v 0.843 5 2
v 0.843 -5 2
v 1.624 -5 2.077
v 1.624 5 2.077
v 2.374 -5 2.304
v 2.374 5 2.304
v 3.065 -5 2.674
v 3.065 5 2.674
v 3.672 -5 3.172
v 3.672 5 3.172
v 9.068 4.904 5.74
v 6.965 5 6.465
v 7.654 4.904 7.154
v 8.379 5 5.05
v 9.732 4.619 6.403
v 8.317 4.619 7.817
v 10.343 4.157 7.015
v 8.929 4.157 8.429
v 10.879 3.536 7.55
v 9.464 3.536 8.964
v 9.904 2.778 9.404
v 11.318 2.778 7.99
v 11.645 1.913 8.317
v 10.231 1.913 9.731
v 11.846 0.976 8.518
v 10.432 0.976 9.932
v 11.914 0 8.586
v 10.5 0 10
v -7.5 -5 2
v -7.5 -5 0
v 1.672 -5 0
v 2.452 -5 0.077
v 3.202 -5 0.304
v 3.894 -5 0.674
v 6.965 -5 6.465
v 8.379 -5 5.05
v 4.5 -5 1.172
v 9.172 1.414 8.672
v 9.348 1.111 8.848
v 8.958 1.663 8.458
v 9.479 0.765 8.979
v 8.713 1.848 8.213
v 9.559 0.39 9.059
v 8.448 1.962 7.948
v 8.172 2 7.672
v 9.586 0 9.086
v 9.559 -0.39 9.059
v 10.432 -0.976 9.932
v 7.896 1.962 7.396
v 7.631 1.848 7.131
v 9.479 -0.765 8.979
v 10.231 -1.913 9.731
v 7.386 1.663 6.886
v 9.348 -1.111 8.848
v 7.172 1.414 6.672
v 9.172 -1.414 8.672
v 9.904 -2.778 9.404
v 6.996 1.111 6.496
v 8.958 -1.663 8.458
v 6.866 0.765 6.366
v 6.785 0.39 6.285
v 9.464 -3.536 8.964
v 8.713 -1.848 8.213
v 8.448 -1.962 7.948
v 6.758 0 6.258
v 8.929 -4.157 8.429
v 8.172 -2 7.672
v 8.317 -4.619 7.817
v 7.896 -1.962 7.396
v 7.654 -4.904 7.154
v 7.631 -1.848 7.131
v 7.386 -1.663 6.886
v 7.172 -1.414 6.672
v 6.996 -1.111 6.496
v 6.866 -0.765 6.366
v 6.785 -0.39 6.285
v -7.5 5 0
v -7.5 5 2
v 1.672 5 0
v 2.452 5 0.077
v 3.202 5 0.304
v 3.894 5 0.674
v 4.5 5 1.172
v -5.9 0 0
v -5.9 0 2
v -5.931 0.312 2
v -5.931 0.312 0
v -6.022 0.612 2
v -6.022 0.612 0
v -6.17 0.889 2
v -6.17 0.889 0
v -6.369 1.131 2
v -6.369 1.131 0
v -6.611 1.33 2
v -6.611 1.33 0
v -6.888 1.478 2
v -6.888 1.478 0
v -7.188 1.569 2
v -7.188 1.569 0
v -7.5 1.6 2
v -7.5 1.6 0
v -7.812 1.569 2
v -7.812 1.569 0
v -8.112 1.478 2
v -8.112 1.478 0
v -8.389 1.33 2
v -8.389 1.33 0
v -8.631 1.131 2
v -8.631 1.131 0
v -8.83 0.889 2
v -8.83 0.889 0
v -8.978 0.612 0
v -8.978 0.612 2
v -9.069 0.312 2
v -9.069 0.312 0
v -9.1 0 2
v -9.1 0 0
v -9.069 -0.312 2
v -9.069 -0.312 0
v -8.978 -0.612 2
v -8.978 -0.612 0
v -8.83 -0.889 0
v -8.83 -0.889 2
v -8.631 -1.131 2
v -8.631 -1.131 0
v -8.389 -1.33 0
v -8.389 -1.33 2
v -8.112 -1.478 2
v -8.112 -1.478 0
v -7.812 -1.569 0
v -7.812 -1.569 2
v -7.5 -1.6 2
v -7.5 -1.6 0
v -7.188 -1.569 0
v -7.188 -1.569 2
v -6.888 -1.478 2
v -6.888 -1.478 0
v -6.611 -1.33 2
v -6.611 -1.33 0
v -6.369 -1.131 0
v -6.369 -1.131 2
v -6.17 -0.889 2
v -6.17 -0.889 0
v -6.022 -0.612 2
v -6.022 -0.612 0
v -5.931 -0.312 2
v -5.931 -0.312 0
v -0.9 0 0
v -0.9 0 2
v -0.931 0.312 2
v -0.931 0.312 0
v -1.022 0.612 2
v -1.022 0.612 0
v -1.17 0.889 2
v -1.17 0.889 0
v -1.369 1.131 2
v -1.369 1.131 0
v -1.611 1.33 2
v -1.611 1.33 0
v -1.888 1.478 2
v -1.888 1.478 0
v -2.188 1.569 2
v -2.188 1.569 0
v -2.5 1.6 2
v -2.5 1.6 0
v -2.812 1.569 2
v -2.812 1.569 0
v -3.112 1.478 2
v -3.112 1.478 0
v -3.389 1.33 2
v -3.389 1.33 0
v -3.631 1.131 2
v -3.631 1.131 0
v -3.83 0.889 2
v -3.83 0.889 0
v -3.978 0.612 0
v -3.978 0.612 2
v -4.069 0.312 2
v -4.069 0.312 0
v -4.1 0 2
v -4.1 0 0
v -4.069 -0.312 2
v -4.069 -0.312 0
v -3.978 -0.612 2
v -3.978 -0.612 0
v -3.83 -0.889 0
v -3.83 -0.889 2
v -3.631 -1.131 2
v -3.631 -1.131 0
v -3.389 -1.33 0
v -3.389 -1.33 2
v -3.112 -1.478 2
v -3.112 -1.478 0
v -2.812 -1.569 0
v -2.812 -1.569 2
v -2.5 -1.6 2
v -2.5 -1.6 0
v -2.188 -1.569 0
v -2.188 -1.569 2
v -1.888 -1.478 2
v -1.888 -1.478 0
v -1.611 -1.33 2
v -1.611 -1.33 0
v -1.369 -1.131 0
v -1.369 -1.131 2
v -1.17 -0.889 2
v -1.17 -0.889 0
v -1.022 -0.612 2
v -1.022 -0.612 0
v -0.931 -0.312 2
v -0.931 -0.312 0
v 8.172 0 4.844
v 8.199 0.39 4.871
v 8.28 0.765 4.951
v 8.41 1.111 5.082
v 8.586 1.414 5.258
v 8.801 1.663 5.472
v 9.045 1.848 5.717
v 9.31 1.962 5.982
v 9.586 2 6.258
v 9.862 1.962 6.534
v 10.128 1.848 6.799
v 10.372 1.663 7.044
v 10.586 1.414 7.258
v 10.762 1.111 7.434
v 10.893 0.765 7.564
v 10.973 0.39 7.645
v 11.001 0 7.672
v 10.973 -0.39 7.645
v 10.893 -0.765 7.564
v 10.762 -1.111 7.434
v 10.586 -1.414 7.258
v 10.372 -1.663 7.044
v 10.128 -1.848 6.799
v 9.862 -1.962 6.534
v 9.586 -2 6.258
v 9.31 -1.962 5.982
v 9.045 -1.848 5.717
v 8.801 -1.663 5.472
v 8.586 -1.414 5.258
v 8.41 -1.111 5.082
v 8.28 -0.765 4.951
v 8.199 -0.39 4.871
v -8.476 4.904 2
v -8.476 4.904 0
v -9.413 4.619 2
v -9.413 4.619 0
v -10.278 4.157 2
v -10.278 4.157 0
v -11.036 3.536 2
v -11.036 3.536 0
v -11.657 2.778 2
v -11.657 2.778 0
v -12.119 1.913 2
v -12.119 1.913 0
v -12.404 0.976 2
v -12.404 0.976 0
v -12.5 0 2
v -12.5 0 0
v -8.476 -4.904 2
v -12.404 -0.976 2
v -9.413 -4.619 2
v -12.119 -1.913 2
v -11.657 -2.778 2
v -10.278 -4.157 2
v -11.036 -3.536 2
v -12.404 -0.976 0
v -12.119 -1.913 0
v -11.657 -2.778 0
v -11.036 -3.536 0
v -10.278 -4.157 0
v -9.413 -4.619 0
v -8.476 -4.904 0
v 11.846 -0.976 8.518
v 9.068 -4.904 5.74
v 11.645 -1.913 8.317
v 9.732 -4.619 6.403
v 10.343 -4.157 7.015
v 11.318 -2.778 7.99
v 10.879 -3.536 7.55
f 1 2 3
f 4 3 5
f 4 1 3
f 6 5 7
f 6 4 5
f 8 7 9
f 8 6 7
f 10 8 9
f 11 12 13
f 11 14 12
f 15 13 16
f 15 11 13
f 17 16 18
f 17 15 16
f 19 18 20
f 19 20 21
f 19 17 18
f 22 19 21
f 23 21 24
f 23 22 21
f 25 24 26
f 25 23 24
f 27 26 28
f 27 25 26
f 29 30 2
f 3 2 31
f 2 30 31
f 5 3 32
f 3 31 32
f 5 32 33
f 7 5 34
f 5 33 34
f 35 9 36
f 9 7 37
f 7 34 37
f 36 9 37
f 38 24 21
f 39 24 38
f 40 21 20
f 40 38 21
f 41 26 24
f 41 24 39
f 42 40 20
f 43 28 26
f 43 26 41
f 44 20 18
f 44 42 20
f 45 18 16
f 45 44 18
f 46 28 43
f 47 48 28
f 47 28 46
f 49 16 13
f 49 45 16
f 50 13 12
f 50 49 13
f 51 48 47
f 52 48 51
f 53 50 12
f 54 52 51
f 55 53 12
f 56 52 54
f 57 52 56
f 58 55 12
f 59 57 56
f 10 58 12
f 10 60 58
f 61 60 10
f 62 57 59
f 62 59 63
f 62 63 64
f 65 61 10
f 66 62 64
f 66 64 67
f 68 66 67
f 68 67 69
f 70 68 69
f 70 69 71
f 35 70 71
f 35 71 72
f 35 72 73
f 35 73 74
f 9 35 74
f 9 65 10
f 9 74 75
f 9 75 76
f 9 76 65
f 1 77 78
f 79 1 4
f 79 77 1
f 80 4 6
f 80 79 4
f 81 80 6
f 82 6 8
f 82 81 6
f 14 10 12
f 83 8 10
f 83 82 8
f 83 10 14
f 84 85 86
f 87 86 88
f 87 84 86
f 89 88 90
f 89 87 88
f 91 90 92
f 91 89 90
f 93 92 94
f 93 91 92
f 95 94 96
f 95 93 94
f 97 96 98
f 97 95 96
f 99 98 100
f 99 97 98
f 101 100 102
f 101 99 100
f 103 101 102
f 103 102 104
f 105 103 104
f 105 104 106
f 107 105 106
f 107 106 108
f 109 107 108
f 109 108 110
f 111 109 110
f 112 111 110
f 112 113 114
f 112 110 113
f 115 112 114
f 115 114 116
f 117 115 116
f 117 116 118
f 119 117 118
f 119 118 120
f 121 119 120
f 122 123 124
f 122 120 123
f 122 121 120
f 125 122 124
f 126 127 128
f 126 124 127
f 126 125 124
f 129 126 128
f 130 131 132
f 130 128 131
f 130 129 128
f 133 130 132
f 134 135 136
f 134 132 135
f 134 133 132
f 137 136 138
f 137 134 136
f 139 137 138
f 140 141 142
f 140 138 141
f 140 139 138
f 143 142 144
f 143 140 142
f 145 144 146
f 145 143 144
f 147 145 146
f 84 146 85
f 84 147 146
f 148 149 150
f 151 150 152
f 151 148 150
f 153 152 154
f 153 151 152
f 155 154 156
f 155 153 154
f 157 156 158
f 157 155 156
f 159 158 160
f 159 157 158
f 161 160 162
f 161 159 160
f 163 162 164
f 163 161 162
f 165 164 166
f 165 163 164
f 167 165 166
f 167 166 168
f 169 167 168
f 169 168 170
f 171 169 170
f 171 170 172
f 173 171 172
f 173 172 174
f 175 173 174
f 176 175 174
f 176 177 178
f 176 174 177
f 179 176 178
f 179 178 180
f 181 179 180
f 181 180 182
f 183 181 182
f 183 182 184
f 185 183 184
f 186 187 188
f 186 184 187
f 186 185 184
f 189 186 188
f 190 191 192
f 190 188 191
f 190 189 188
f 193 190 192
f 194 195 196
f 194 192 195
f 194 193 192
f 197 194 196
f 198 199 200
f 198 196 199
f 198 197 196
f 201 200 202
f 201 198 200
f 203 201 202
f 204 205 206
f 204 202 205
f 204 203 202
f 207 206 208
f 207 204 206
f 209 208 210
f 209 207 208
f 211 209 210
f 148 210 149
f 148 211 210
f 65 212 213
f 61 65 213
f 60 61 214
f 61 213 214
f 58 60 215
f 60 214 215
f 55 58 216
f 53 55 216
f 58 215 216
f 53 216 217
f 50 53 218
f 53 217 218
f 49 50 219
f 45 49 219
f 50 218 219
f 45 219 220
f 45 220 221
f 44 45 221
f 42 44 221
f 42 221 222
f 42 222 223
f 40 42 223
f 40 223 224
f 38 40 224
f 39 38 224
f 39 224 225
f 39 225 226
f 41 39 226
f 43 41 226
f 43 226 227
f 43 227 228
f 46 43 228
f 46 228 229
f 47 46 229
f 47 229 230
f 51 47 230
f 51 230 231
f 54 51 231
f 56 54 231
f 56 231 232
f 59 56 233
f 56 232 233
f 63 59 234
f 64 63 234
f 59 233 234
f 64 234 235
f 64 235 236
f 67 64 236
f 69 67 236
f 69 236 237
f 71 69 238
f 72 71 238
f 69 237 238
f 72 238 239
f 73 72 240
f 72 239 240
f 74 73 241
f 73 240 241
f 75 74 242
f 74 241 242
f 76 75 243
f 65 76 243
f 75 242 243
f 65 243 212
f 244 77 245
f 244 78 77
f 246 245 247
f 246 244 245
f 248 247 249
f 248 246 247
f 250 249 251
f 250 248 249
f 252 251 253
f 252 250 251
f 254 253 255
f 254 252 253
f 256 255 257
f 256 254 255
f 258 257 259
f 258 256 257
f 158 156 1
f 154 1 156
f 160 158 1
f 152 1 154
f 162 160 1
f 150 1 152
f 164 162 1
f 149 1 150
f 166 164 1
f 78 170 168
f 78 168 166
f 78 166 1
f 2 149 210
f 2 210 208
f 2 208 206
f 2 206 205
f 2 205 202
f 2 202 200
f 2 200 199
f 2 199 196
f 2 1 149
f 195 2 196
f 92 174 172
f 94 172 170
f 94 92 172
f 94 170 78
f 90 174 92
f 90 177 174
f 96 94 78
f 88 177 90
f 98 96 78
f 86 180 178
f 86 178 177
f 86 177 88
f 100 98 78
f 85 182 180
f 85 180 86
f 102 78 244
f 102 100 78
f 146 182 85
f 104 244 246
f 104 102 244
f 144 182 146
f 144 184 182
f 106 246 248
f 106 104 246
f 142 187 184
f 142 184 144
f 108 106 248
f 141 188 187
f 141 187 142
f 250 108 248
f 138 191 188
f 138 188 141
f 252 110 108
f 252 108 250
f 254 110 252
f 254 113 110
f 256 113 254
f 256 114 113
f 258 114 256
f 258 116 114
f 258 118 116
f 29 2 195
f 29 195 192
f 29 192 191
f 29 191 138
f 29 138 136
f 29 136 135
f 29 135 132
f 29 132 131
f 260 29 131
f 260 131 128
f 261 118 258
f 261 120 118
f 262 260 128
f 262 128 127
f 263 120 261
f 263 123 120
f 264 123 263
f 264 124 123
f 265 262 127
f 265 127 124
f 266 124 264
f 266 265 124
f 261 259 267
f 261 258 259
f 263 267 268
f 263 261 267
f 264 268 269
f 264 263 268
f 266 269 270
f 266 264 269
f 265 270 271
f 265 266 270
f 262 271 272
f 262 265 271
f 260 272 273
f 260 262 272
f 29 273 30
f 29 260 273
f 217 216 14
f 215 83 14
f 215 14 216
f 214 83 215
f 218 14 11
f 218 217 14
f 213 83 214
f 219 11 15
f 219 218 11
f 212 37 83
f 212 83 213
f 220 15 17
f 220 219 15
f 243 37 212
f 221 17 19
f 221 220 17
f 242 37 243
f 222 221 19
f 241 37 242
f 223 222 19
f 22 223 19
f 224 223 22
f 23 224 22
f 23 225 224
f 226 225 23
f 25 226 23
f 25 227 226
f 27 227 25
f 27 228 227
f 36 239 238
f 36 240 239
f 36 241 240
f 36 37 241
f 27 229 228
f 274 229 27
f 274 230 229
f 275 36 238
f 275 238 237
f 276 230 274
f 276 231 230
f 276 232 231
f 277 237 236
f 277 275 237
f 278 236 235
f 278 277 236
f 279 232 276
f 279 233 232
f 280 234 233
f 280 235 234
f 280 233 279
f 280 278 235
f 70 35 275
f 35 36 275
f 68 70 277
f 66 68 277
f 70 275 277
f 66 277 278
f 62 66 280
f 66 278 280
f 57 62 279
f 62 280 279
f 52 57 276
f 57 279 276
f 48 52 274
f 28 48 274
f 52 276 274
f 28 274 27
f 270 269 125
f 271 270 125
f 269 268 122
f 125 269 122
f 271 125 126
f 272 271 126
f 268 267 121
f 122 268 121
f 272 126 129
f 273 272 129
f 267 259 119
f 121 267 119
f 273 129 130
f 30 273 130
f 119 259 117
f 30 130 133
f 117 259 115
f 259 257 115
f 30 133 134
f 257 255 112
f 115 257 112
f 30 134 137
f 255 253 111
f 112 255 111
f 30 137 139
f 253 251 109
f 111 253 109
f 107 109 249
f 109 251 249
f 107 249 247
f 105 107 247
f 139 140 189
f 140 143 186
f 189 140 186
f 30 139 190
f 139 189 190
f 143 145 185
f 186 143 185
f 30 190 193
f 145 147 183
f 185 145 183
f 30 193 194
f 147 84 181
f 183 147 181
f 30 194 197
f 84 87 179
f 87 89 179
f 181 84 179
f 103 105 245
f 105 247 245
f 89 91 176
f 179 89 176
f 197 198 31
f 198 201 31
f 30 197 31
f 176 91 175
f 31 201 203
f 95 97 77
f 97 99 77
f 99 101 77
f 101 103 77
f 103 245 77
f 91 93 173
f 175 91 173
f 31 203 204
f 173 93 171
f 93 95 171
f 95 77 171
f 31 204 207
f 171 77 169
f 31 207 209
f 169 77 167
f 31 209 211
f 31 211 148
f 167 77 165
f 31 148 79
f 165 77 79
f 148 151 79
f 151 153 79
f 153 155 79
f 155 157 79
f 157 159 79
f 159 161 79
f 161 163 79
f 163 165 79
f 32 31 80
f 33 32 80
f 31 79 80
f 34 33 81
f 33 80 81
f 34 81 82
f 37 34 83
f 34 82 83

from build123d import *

# Parameters (mm, degrees)
SKETCH_1_W          = 25
SKETCH_1_H          = 10
SKETCH_1_R          = 1.6
EXTRUDE_1_DEPTH     = 10
CUT_EXTRUDE_1_REACH = 20.875
CUT_EXTRUDE_2_REACH = 20.875
SKETCH_4_R          = 2
CUT_EXTRUDE_3_DEPTH = 20.017855396
FILLET_1_R          = 4
FILLET_2_R          = 5


with BuildPart() as part:
    # ｽｹｯﾁ1 → ﾎﾞｽ - 押し出し1 (new body)
    with BuildSketch(Plane.XY):
        Rectangle(SKETCH_1_W, SKETCH_1_H)
        with Locations((-7.5, 0)):
            Circle(SKETCH_1_R, mode=Mode.SUBTRACT)
        with Locations((-2.5, 0)):
            Circle(SKETCH_1_R, mode=Mode.SUBTRACT)
    extrude(amount=EXTRUDE_1_DEPTH)

    # ｽｹｯﾁ2 → ｶｯﾄ - 押し出し1 (cut, up to next)
    with BuildSketch(Plane.XZ.offset(5), mode=Mode.PRIVATE) as cut_extrude_1_sk1:
        Polygon((2.5, 10), (10.5, 10), (2.5, 2), (-12.5, 2), (-12.5, 10), align=None)
    cut_extrude_1_tool1 = extrude(cut_extrude_1_sk1.sketch, amount=-CUT_EXTRUDE_1_REACH, mode=Mode.PRIVATE) & part.part
    # ｽｹｯﾁ2 → ｶｯﾄ - 押し出し1 (cut, up to next)
    with BuildSketch(Plane.XZ.offset(5), mode=Mode.PRIVATE) as cut_extrude_1_sk2:
        Polygon((3.328427125, 0), (12.5, 9.171572875), (12.5, 0), align=None)
    cut_extrude_1_tool2 = extrude(cut_extrude_1_sk2.sketch, amount=-CUT_EXTRUDE_1_REACH, mode=Mode.PRIVATE) & part.part
    add(cut_extrude_1_tool1.solids().sort_by_distance((-2.859649, -5, 6.280702))[0], mode=Mode.SUBTRACT)
    add(cut_extrude_1_tool2.solids().sort_by_distance((9.442809, -5, 3.057191))[0], mode=Mode.SUBTRACT)

    # ｽｹｯﾁ3 → ｶｯﾄ - 押し出し2 (cut, up to next)
    with BuildSketch(Plane.XZ.offset(5), mode=Mode.PRIVATE) as cut_extrude_2_sk1:
        Polygon((10.5, 10), (11.914213562, 8.585786438), (12.5, 9.171572875), (12.5, 10), align=None)
    cut_extrude_2_tool1 = extrude(cut_extrude_2_sk1.sketch, amount=-CUT_EXTRUDE_2_REACH, mode=Mode.PRIVATE) & part.part
    add(cut_extrude_2_tool1.solids().sort_by_distance((11.735702, -5, 9.488155))[0], mode=Mode.SUBTRACT)

    # ｽｹｯﾁ4 → ｶｯﾄ - 押し出し3 (cut, through all)
    with BuildSketch(Plane(origin=(1.664213562, 0, -1.664213562), x_dir=(-0.7071067811865509, 0, -0.7071067811865441), z_dir=(0.7071067811865441, 0, -0.7071067811865509))):
        with Locations((-11.203553391, 0)):
            Circle(SKETCH_4_R)
    extrude(amount=-CUT_EXTRUDE_3_DEPTH, mode=Mode.SUBTRACT)

    # ﾌｨﾚｯﾄ1
    fillet_1_edges = [part.edges().sort_by_distance(p)[0] for p in [
        (3.328427125, 0, 0),
        (2.5, 0, 2),
    ]]
    fillet(fillet_1_edges, radius=FILLET_1_R)

    # ﾌｨﾚｯﾄ2
    fillet_2_edges = [part.edges().sort_by_distance(p)[0] for p in [
        (11.207106781, 5, 9.292893219),
        (11.207106781, -5, 9.292893219),
        (-12.5, -5, 1),
        (-12.5, 5, 1),
    ]]
    fillet(fillet_2_edges, radius=FILLET_2_R - 0.0001)  # a hair under: the kernel refuses the full size


solid = part.part
